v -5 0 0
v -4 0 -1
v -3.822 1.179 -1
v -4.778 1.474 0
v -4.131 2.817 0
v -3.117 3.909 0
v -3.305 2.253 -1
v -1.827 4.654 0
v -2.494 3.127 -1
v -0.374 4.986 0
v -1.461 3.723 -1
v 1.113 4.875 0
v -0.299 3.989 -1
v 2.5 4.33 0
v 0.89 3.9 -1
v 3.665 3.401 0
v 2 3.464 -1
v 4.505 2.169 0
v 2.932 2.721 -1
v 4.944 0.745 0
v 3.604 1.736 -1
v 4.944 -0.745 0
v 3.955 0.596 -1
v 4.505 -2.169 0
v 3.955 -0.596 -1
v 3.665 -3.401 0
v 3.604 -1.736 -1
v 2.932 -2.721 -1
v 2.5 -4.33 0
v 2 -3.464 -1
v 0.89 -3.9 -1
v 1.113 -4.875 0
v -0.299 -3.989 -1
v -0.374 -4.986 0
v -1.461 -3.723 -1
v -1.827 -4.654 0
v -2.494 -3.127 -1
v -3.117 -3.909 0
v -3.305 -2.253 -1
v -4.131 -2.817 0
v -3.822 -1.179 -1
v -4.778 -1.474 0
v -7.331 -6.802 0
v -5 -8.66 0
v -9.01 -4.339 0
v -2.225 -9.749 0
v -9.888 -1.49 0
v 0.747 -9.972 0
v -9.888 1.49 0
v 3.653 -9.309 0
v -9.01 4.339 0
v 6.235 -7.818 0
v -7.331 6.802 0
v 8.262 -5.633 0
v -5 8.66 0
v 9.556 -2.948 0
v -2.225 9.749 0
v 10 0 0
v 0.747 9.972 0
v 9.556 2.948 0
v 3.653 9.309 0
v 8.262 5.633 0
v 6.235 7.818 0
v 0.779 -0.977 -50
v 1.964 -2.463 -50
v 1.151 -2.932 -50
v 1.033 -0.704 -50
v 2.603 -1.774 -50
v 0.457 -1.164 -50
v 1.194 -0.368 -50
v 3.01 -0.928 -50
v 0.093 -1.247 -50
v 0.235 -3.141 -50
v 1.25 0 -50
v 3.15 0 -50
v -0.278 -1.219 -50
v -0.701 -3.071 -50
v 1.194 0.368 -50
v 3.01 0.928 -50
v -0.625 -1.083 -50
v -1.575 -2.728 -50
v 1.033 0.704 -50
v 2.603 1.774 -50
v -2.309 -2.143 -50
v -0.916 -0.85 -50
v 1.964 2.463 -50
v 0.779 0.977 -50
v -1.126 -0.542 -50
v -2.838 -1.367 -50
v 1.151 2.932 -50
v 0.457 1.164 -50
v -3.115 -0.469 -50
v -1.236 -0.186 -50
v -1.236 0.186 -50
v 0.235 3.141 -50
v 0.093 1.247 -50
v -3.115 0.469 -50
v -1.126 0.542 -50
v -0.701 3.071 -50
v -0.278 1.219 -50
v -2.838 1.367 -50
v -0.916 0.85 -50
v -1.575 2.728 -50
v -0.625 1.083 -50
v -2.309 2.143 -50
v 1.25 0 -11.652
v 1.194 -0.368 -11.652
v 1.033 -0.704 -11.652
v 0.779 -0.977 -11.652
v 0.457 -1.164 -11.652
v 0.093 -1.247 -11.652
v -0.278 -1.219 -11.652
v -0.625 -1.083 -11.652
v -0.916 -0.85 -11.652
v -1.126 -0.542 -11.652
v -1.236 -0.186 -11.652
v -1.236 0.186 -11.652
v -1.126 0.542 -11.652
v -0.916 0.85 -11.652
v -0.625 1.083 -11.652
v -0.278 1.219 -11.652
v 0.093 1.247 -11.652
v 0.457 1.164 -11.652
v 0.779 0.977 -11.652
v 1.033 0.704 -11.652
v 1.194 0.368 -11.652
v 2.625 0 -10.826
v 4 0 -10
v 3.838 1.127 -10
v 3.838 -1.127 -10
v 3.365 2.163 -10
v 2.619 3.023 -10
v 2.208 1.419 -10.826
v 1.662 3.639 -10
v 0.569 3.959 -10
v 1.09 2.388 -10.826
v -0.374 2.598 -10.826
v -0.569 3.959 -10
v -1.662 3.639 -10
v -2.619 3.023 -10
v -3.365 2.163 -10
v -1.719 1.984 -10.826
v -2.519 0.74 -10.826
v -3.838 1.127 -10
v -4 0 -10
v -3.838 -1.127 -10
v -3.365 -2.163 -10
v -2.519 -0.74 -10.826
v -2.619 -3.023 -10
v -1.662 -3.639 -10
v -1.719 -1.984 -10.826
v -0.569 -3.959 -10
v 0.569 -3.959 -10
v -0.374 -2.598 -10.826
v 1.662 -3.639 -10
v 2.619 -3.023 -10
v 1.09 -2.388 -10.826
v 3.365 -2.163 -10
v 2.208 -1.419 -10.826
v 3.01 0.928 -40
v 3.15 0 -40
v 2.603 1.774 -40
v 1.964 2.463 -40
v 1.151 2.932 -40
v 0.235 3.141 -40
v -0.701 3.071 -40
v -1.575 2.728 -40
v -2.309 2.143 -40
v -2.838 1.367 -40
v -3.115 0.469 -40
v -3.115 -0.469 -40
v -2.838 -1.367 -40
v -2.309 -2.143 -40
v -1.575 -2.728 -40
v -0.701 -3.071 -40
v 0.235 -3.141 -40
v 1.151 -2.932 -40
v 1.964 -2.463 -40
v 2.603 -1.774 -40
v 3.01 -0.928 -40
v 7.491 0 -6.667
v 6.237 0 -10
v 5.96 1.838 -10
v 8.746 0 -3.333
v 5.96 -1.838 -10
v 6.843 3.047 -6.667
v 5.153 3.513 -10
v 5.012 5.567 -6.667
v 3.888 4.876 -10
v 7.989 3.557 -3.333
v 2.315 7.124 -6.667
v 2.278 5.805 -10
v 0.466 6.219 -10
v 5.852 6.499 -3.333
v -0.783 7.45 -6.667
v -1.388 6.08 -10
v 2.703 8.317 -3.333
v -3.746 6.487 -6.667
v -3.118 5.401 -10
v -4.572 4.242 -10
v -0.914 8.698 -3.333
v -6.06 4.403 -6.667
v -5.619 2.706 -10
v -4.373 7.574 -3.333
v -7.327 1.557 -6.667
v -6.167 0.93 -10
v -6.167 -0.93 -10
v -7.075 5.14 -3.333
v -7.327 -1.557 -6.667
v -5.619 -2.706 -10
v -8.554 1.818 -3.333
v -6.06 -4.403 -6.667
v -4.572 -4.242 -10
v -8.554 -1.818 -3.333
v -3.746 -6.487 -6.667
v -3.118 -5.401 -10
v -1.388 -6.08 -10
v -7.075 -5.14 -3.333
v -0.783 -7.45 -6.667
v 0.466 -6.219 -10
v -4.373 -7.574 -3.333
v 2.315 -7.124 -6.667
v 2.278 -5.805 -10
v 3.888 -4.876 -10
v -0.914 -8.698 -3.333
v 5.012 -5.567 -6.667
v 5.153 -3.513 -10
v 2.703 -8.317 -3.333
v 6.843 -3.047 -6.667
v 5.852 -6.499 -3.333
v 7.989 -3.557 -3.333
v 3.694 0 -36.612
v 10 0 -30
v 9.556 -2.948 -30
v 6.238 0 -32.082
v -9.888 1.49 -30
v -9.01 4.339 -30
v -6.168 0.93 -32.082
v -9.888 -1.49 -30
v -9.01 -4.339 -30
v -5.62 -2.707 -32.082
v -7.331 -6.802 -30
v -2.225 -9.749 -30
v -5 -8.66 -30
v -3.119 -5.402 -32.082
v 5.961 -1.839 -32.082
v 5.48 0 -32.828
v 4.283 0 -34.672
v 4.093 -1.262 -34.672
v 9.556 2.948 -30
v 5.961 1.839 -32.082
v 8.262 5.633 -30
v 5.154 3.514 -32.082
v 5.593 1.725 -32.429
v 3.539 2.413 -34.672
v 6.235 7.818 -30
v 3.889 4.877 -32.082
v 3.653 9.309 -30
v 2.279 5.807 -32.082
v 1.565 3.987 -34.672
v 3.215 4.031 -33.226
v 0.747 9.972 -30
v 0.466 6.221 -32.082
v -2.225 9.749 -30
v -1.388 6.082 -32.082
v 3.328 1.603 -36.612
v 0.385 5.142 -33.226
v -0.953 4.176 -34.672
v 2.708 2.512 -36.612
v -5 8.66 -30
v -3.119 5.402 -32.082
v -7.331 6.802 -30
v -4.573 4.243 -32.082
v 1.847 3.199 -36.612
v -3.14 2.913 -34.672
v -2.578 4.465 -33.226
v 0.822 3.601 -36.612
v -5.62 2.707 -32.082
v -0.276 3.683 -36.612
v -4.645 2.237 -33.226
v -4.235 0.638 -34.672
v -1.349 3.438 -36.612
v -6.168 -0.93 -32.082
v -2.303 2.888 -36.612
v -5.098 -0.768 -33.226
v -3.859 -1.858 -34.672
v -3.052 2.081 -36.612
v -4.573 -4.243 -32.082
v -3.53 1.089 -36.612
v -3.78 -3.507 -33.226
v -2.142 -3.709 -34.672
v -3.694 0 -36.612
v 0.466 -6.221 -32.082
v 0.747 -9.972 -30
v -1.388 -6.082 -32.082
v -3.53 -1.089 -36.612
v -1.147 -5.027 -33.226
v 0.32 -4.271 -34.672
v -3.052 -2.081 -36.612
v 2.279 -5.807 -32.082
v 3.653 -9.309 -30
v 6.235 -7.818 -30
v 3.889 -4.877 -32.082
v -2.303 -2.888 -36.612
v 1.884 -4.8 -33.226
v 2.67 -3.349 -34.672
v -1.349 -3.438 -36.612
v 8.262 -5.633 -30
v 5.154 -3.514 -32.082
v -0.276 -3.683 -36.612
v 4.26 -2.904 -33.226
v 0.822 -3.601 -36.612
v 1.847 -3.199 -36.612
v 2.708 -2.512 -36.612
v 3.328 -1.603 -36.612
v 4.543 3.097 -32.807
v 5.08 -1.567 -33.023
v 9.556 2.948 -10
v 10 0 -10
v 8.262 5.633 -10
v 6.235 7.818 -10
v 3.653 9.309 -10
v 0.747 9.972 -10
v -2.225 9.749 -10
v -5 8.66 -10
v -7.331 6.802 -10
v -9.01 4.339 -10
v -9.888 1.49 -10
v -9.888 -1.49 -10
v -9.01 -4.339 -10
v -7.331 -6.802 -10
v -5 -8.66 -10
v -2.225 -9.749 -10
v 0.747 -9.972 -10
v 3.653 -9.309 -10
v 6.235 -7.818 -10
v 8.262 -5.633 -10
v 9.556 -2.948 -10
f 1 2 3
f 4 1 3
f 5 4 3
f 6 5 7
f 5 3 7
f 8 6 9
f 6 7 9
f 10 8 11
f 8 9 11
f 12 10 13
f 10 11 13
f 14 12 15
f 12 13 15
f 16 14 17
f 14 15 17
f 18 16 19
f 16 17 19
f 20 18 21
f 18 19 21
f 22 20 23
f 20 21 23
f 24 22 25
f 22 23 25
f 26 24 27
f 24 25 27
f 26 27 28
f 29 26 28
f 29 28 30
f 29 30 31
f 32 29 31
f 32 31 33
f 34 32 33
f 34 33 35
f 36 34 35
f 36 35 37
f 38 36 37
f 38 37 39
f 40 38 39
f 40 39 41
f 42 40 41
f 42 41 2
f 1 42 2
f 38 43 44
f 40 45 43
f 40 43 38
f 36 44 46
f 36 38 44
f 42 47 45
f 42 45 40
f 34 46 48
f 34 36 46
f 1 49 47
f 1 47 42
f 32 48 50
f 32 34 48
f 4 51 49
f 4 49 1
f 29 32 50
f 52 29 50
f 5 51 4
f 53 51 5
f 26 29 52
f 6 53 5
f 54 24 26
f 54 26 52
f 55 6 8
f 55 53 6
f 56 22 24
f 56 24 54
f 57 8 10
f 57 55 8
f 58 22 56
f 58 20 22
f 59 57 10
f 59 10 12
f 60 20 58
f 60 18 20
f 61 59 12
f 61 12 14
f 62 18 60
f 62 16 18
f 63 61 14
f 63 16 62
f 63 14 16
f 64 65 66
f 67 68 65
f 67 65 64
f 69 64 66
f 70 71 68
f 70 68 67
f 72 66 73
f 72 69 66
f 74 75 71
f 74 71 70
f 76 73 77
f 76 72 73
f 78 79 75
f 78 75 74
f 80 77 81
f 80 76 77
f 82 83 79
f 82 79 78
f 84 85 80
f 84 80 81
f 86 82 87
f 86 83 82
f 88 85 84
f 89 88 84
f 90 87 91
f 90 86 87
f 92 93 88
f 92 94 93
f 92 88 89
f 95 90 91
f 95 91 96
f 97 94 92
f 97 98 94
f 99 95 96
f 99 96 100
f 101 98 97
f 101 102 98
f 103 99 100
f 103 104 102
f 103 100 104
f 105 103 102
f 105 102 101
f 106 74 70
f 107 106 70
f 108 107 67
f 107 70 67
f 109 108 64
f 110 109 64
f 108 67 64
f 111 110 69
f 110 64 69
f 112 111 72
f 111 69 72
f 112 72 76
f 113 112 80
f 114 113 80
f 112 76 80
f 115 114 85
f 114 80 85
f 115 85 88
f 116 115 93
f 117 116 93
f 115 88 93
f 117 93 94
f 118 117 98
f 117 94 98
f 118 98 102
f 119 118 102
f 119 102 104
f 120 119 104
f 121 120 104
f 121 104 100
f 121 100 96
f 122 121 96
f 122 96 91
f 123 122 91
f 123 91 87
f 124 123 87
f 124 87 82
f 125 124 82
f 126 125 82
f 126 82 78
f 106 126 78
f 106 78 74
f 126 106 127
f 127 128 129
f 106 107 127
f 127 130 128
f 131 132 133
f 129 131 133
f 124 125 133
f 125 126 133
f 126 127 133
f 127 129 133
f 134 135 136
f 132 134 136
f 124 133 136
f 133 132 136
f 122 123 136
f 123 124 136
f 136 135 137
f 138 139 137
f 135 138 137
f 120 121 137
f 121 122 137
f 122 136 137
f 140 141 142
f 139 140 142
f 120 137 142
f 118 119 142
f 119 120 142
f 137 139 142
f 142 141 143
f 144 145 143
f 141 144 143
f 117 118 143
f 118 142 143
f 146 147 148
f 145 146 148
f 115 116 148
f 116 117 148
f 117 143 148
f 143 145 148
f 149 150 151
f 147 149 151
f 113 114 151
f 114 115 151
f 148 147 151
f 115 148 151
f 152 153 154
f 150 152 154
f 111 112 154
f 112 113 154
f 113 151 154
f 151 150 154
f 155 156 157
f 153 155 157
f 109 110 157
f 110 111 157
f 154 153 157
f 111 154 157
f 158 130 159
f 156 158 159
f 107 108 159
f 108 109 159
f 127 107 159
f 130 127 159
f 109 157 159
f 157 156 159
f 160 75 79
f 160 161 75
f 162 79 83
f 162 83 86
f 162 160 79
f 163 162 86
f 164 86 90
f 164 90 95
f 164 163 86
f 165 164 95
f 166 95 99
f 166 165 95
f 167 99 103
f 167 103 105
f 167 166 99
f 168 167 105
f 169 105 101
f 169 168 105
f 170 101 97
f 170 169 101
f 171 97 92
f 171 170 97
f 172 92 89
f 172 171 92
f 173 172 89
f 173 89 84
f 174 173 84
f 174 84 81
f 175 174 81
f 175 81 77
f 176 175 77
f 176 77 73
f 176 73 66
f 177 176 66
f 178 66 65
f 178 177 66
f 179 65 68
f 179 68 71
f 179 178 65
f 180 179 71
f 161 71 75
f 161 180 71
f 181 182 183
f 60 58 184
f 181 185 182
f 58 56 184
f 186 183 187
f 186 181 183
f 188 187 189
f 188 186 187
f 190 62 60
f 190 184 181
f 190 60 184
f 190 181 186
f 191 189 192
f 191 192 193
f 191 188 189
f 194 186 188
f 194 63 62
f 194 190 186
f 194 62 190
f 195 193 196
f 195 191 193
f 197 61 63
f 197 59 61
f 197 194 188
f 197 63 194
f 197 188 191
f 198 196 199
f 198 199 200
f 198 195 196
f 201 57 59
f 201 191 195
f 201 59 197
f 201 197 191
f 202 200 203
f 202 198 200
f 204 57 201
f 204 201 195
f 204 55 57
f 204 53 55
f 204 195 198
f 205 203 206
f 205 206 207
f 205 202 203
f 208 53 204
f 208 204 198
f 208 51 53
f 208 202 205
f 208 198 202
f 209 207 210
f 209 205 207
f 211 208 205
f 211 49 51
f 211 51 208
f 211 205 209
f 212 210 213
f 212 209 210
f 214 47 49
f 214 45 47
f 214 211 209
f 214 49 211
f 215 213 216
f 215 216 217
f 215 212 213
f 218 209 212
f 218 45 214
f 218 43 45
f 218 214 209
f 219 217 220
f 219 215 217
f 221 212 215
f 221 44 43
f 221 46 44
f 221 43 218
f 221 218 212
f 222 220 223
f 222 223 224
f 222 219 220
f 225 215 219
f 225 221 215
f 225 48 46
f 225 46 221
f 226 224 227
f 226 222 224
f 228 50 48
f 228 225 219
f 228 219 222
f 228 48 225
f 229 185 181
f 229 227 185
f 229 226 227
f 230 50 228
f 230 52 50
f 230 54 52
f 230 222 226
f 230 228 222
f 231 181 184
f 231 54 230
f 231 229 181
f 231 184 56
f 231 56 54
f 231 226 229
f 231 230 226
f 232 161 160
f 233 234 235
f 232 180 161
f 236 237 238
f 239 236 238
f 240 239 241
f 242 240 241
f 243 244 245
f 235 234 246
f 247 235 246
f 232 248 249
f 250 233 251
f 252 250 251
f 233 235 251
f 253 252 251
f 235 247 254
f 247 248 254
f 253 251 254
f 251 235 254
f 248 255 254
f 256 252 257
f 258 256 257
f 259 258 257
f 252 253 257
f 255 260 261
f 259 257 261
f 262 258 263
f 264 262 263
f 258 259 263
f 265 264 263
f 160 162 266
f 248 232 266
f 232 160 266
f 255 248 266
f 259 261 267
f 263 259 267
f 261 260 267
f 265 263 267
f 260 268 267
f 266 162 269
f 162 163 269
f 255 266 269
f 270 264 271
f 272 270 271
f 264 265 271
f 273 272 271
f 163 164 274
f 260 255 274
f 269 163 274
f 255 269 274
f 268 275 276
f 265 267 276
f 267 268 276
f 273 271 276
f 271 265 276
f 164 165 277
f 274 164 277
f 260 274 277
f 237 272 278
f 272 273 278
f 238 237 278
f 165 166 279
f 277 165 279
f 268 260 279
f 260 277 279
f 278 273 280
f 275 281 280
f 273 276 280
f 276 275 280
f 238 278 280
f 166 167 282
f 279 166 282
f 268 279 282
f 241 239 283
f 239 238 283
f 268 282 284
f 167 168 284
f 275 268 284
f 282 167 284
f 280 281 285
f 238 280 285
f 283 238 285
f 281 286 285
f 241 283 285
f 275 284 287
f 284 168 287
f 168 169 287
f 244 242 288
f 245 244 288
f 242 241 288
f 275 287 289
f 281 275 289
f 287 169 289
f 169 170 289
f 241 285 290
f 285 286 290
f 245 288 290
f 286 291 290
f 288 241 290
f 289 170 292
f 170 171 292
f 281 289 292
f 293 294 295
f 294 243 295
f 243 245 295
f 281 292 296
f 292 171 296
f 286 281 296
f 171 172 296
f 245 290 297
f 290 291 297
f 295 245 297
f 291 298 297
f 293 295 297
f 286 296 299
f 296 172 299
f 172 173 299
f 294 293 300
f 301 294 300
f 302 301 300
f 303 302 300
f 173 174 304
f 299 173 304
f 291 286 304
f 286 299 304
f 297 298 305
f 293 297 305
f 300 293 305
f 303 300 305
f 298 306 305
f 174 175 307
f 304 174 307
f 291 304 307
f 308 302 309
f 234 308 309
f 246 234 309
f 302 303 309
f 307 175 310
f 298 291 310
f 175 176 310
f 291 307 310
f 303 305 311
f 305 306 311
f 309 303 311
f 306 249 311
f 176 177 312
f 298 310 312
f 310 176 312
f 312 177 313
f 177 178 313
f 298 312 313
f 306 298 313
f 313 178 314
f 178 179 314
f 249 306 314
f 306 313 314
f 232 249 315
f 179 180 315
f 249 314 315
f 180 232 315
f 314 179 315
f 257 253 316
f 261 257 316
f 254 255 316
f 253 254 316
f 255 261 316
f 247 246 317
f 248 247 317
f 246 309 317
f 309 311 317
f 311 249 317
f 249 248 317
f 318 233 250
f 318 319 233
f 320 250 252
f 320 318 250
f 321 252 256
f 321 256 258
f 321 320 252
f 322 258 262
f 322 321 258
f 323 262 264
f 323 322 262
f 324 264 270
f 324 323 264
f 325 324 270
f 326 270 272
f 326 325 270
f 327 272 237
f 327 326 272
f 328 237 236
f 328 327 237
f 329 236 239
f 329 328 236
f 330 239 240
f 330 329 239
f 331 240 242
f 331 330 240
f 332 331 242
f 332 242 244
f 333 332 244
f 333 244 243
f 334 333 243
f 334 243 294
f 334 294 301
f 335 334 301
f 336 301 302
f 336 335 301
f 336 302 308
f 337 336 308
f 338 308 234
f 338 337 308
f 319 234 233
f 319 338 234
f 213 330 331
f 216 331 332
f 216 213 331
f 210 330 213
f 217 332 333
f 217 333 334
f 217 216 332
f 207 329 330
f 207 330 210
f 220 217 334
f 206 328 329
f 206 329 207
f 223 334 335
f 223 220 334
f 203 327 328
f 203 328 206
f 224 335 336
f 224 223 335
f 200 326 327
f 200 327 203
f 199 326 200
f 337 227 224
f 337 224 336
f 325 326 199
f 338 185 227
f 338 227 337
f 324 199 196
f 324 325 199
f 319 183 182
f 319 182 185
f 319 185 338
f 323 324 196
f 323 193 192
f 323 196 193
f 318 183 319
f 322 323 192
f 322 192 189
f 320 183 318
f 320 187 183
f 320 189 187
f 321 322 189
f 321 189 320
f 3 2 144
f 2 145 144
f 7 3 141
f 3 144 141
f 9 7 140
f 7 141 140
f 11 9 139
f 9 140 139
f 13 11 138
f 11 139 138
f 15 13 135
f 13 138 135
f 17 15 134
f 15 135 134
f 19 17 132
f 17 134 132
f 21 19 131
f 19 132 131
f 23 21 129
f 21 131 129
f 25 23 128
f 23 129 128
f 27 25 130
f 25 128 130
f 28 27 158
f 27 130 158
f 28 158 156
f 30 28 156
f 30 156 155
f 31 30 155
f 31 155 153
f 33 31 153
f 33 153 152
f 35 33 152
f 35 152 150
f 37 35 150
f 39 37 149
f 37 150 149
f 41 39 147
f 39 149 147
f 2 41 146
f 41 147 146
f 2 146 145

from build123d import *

# Parameters (mm, degrees)
F2_R           = 1.25
F3_DEPTH       = 50.001
F4_R           = 2
F5_DEPTH       = 35
F7_D           = 8
F7_DEPTH       = 10
F7_CSINK_D     = 10
F7_CSINK_ANGLE = 90
F7_TIP         = 2.4034424761


with BuildPart() as f1:
    # F0 (on Front) → F1 (revolve)
    with BuildSketch(Plane.XZ):
        Polygon((6.2365774143, -10), (10, 0), (0, 0), (0, -50), (3.15, -50), (3.15, -40), (3.15, -30), (10, -30), (10, -10), align=None)
        with BuildLine():
            add(Edge.make_bspline(
                [(10, -30), (7.4056518976, -31.2777532916), (6.0791644046, -31.9480016), (3.9945104258, -34.715284016), (3.61089129, -36.7225967348), (3.15, -40)],
                knots=[0, 0, 0, 0, 0.3551625171, 0.6094131259, 1, 1, 1, 1], degree=3))
            Line((10, -30), (3.15, -30))
            Line((3.15, -30), (3.15, -40))
        make_face()
    revolve(axis=Axis((0, 0, -25), (0, 0, 1)))

    # F2 (on face) → F3 (cut, through all)
    with BuildSketch(Plane(origin=(0, 0, -50), x_dir=(1, 0, 0), z_dir=(0, 0, -1))):
        Circle(F2_R)
    extrude(amount=-F3_DEPTH, mode=Mode.SUBTRACT)

    # F4 (on face) → F5 (cut)
    with BuildSketch(Plane(origin=(0, 0, -50), x_dir=(1, 0, 0), z_dir=(0, 0, -1))):
        Circle(F4_R)
    extrude(amount=F5_DEPTH, mode=Mode.SUBTRACT)

    # F7
    with Locations(Plane.XY):
        with Locations((0, 0)):
            CounterSinkHole(F7_D / 2, F7_CSINK_D / 2, depth=F7_DEPTH, counter_sink_angle=F7_CSINK_ANGLE)
            with Locations((0, 0, -(F7_DEPTH + F7_TIP / 2))):  # 118° drill point
                Cone(0, F7_D / 2, F7_TIP, mode=Mode.SUBTRACT)


solid = f1.part
